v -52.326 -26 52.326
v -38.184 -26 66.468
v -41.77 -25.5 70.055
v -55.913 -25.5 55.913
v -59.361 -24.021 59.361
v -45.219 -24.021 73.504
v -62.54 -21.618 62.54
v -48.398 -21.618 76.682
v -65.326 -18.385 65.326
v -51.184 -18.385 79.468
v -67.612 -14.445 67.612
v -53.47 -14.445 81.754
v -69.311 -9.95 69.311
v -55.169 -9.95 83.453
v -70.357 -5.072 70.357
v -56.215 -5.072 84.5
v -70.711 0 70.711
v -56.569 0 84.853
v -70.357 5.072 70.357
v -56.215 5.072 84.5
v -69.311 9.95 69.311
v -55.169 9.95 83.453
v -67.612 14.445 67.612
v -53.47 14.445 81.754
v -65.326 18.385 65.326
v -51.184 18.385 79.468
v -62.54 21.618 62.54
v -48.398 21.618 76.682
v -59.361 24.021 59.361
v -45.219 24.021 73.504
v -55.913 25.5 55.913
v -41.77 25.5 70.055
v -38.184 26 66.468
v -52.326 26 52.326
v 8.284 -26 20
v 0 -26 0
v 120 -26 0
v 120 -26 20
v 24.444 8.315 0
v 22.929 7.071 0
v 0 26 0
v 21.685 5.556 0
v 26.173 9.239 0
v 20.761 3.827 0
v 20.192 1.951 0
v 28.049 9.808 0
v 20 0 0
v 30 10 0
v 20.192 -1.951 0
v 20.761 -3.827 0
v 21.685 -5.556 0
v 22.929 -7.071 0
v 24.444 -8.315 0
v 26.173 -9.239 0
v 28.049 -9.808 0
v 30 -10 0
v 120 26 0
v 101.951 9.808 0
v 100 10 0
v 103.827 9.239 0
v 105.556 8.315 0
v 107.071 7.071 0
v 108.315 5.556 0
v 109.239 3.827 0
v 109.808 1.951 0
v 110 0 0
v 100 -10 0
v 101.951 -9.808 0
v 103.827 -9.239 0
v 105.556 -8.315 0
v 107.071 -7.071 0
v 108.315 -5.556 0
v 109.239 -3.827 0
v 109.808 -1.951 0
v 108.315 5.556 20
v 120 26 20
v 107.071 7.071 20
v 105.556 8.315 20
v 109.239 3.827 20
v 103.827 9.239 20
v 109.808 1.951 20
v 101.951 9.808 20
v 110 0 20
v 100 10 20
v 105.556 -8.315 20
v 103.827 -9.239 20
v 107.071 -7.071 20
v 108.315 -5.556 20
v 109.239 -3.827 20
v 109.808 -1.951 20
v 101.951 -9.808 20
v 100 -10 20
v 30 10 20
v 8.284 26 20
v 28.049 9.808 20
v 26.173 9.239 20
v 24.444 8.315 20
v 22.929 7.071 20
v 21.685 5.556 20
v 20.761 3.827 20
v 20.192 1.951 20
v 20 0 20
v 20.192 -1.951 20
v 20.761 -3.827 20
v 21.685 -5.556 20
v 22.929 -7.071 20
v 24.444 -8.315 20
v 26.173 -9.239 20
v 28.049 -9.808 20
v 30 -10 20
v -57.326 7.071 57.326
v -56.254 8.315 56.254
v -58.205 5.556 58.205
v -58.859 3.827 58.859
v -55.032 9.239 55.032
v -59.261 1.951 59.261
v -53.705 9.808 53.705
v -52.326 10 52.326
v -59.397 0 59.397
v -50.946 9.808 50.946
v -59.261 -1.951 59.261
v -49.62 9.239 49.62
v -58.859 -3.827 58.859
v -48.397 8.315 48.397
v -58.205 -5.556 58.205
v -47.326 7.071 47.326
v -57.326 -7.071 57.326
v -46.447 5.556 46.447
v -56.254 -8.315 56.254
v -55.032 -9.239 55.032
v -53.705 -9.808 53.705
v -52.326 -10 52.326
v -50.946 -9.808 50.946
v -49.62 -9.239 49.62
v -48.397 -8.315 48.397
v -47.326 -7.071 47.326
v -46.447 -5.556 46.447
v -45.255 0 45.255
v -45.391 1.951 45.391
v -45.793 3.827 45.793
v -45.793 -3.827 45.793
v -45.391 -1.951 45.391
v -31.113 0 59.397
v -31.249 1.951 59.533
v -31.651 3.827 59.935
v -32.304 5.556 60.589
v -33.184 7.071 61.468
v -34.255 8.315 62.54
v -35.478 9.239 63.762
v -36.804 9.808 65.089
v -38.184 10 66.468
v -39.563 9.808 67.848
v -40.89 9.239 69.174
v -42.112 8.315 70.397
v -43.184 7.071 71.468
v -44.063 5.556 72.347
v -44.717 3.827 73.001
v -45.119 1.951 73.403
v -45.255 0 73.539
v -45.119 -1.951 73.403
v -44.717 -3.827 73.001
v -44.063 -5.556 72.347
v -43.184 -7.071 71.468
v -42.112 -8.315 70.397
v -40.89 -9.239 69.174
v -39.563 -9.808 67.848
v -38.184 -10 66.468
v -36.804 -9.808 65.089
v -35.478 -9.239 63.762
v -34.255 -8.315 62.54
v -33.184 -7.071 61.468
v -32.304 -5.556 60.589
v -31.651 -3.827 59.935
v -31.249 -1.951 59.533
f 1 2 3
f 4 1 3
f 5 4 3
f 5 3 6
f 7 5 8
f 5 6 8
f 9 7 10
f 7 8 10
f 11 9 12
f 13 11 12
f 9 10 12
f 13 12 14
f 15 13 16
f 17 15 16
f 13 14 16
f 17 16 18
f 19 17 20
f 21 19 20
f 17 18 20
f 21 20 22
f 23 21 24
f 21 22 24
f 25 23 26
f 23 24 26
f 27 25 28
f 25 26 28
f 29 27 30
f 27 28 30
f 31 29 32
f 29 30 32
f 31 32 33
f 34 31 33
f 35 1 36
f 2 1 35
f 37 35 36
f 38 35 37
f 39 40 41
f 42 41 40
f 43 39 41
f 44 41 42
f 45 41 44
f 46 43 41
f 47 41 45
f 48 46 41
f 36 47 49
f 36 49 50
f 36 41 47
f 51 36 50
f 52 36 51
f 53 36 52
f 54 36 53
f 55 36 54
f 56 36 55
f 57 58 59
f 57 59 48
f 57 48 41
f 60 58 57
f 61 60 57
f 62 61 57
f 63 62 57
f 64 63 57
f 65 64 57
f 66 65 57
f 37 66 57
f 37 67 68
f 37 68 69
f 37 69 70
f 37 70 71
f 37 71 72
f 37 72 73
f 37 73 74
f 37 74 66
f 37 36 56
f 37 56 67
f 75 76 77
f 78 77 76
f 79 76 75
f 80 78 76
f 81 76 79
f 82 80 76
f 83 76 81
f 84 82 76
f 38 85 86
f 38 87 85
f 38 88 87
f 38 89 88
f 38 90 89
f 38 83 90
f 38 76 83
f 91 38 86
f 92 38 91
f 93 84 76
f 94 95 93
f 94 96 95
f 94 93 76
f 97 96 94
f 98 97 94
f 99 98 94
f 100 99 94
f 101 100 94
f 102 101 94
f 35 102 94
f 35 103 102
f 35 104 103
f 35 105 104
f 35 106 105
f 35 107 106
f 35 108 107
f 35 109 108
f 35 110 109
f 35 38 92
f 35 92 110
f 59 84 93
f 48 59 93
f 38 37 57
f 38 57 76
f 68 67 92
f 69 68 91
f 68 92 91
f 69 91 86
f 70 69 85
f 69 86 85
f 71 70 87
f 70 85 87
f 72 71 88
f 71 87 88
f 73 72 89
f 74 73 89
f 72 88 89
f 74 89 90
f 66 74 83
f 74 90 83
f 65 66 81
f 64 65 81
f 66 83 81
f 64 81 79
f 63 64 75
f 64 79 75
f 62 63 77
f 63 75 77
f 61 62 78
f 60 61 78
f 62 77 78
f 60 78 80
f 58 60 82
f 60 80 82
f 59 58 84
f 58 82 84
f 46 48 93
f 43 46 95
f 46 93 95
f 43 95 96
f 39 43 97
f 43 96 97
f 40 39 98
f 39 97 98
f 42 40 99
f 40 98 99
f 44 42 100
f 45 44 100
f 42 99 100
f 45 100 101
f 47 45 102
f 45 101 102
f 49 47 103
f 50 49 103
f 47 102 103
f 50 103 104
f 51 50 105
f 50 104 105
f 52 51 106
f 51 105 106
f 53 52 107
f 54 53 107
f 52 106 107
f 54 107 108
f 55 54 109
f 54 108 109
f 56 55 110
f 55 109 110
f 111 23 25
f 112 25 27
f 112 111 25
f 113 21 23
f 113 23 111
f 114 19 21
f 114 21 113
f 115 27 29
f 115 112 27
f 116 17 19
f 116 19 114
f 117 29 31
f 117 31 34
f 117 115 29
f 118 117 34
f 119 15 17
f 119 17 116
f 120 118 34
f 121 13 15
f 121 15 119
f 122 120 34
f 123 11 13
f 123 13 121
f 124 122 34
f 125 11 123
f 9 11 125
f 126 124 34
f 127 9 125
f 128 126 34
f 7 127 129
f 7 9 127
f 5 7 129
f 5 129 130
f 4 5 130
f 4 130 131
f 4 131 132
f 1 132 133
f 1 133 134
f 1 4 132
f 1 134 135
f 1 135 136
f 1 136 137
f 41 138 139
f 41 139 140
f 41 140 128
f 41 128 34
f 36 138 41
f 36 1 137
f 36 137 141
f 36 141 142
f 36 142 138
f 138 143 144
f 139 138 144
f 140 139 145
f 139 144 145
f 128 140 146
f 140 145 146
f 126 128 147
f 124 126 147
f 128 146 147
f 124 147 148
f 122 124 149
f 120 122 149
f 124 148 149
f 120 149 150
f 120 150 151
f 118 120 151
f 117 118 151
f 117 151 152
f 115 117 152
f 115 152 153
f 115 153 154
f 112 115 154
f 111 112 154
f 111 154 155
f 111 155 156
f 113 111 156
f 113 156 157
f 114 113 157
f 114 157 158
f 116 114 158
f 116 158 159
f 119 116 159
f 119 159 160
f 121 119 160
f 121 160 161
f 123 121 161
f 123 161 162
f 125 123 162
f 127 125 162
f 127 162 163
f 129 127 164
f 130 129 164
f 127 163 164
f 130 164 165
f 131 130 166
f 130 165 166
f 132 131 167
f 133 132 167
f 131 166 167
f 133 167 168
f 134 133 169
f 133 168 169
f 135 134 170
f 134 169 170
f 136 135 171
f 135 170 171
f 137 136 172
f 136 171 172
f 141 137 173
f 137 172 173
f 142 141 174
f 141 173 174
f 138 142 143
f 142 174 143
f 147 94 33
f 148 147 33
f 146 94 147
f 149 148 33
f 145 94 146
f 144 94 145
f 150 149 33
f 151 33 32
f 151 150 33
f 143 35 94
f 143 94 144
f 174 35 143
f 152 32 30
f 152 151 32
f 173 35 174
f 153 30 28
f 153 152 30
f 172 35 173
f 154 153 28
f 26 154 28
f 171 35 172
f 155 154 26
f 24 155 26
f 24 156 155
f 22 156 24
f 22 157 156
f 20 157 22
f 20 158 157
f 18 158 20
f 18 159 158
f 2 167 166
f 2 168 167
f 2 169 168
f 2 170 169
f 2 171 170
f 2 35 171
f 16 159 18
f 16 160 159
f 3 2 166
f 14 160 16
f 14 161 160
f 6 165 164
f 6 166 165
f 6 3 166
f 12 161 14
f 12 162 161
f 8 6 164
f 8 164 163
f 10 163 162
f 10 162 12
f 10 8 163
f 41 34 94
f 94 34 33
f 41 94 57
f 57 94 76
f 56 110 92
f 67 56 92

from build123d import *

# Parameters (mm, degrees)
F1_DEPTH = 26
F3_DEPTH = 20.001
F4_R     = 10
F5_DEPTH = 70.001


with BuildPart() as f1:
    # F0 (on Front) → F1 (new body, symmetric)
    with BuildSketch(Plane.XZ):
        Polygon((-70.7106781187, 70.7106781187), (0, 0), (120, 0), (120, 20), (8.2842712475, 20), (-56.5685424949, 84.8528137424), align=None)
    extrude(amount=F1_DEPTH, both=True)

    # F2 (on face) → F3 (cut, through all)
    with BuildSketch(Plane.XY.offset(20)):
        with BuildLine():
            Line((30, -10), (100, -10))
            ThreePointArc((100, -10), (110, 0), (100, 10))
            Line((100, 10), (30, 10))
            ThreePointArc((30, 10), (20, 0), (30, -10))
        make_face()
    extrude(amount=-F3_DEPTH, mode=Mode.SUBTRACT)

    # F4 (on face) → F5 (cut, through all)
    with BuildSketch(Plane(origin=(14.1421356237, 0, 14.1421356237), x_dir=(0.7071067812, 0, -0.7071067812), z_dir=(0.7071067812, 0, 0.7071067812))):
        with Locations((-74, 0)):
            Circle(F4_R)
        with BuildLine():
            ThreePointArc((-74, -26), (-92.3847763543, -18.3847762674), (-100, 1.228e-07))
            Line((-100, 1.228e-07), (-100, -26))
            Line((-100, -26), (-74, -26))
        make_face()
        with BuildLine():
            ThreePointArc((-100, 1.228e-07), (-92.3847762674, 18.3847763543), (-74, 26))
            Line((-74, 26), (-100, 26))
            Line((-100, 26), (-100, 1.228e-07))
        make_face()
    extrude(amount=-F5_DEPTH, mode=Mode.SUBTRACT)


solid = f1.part
